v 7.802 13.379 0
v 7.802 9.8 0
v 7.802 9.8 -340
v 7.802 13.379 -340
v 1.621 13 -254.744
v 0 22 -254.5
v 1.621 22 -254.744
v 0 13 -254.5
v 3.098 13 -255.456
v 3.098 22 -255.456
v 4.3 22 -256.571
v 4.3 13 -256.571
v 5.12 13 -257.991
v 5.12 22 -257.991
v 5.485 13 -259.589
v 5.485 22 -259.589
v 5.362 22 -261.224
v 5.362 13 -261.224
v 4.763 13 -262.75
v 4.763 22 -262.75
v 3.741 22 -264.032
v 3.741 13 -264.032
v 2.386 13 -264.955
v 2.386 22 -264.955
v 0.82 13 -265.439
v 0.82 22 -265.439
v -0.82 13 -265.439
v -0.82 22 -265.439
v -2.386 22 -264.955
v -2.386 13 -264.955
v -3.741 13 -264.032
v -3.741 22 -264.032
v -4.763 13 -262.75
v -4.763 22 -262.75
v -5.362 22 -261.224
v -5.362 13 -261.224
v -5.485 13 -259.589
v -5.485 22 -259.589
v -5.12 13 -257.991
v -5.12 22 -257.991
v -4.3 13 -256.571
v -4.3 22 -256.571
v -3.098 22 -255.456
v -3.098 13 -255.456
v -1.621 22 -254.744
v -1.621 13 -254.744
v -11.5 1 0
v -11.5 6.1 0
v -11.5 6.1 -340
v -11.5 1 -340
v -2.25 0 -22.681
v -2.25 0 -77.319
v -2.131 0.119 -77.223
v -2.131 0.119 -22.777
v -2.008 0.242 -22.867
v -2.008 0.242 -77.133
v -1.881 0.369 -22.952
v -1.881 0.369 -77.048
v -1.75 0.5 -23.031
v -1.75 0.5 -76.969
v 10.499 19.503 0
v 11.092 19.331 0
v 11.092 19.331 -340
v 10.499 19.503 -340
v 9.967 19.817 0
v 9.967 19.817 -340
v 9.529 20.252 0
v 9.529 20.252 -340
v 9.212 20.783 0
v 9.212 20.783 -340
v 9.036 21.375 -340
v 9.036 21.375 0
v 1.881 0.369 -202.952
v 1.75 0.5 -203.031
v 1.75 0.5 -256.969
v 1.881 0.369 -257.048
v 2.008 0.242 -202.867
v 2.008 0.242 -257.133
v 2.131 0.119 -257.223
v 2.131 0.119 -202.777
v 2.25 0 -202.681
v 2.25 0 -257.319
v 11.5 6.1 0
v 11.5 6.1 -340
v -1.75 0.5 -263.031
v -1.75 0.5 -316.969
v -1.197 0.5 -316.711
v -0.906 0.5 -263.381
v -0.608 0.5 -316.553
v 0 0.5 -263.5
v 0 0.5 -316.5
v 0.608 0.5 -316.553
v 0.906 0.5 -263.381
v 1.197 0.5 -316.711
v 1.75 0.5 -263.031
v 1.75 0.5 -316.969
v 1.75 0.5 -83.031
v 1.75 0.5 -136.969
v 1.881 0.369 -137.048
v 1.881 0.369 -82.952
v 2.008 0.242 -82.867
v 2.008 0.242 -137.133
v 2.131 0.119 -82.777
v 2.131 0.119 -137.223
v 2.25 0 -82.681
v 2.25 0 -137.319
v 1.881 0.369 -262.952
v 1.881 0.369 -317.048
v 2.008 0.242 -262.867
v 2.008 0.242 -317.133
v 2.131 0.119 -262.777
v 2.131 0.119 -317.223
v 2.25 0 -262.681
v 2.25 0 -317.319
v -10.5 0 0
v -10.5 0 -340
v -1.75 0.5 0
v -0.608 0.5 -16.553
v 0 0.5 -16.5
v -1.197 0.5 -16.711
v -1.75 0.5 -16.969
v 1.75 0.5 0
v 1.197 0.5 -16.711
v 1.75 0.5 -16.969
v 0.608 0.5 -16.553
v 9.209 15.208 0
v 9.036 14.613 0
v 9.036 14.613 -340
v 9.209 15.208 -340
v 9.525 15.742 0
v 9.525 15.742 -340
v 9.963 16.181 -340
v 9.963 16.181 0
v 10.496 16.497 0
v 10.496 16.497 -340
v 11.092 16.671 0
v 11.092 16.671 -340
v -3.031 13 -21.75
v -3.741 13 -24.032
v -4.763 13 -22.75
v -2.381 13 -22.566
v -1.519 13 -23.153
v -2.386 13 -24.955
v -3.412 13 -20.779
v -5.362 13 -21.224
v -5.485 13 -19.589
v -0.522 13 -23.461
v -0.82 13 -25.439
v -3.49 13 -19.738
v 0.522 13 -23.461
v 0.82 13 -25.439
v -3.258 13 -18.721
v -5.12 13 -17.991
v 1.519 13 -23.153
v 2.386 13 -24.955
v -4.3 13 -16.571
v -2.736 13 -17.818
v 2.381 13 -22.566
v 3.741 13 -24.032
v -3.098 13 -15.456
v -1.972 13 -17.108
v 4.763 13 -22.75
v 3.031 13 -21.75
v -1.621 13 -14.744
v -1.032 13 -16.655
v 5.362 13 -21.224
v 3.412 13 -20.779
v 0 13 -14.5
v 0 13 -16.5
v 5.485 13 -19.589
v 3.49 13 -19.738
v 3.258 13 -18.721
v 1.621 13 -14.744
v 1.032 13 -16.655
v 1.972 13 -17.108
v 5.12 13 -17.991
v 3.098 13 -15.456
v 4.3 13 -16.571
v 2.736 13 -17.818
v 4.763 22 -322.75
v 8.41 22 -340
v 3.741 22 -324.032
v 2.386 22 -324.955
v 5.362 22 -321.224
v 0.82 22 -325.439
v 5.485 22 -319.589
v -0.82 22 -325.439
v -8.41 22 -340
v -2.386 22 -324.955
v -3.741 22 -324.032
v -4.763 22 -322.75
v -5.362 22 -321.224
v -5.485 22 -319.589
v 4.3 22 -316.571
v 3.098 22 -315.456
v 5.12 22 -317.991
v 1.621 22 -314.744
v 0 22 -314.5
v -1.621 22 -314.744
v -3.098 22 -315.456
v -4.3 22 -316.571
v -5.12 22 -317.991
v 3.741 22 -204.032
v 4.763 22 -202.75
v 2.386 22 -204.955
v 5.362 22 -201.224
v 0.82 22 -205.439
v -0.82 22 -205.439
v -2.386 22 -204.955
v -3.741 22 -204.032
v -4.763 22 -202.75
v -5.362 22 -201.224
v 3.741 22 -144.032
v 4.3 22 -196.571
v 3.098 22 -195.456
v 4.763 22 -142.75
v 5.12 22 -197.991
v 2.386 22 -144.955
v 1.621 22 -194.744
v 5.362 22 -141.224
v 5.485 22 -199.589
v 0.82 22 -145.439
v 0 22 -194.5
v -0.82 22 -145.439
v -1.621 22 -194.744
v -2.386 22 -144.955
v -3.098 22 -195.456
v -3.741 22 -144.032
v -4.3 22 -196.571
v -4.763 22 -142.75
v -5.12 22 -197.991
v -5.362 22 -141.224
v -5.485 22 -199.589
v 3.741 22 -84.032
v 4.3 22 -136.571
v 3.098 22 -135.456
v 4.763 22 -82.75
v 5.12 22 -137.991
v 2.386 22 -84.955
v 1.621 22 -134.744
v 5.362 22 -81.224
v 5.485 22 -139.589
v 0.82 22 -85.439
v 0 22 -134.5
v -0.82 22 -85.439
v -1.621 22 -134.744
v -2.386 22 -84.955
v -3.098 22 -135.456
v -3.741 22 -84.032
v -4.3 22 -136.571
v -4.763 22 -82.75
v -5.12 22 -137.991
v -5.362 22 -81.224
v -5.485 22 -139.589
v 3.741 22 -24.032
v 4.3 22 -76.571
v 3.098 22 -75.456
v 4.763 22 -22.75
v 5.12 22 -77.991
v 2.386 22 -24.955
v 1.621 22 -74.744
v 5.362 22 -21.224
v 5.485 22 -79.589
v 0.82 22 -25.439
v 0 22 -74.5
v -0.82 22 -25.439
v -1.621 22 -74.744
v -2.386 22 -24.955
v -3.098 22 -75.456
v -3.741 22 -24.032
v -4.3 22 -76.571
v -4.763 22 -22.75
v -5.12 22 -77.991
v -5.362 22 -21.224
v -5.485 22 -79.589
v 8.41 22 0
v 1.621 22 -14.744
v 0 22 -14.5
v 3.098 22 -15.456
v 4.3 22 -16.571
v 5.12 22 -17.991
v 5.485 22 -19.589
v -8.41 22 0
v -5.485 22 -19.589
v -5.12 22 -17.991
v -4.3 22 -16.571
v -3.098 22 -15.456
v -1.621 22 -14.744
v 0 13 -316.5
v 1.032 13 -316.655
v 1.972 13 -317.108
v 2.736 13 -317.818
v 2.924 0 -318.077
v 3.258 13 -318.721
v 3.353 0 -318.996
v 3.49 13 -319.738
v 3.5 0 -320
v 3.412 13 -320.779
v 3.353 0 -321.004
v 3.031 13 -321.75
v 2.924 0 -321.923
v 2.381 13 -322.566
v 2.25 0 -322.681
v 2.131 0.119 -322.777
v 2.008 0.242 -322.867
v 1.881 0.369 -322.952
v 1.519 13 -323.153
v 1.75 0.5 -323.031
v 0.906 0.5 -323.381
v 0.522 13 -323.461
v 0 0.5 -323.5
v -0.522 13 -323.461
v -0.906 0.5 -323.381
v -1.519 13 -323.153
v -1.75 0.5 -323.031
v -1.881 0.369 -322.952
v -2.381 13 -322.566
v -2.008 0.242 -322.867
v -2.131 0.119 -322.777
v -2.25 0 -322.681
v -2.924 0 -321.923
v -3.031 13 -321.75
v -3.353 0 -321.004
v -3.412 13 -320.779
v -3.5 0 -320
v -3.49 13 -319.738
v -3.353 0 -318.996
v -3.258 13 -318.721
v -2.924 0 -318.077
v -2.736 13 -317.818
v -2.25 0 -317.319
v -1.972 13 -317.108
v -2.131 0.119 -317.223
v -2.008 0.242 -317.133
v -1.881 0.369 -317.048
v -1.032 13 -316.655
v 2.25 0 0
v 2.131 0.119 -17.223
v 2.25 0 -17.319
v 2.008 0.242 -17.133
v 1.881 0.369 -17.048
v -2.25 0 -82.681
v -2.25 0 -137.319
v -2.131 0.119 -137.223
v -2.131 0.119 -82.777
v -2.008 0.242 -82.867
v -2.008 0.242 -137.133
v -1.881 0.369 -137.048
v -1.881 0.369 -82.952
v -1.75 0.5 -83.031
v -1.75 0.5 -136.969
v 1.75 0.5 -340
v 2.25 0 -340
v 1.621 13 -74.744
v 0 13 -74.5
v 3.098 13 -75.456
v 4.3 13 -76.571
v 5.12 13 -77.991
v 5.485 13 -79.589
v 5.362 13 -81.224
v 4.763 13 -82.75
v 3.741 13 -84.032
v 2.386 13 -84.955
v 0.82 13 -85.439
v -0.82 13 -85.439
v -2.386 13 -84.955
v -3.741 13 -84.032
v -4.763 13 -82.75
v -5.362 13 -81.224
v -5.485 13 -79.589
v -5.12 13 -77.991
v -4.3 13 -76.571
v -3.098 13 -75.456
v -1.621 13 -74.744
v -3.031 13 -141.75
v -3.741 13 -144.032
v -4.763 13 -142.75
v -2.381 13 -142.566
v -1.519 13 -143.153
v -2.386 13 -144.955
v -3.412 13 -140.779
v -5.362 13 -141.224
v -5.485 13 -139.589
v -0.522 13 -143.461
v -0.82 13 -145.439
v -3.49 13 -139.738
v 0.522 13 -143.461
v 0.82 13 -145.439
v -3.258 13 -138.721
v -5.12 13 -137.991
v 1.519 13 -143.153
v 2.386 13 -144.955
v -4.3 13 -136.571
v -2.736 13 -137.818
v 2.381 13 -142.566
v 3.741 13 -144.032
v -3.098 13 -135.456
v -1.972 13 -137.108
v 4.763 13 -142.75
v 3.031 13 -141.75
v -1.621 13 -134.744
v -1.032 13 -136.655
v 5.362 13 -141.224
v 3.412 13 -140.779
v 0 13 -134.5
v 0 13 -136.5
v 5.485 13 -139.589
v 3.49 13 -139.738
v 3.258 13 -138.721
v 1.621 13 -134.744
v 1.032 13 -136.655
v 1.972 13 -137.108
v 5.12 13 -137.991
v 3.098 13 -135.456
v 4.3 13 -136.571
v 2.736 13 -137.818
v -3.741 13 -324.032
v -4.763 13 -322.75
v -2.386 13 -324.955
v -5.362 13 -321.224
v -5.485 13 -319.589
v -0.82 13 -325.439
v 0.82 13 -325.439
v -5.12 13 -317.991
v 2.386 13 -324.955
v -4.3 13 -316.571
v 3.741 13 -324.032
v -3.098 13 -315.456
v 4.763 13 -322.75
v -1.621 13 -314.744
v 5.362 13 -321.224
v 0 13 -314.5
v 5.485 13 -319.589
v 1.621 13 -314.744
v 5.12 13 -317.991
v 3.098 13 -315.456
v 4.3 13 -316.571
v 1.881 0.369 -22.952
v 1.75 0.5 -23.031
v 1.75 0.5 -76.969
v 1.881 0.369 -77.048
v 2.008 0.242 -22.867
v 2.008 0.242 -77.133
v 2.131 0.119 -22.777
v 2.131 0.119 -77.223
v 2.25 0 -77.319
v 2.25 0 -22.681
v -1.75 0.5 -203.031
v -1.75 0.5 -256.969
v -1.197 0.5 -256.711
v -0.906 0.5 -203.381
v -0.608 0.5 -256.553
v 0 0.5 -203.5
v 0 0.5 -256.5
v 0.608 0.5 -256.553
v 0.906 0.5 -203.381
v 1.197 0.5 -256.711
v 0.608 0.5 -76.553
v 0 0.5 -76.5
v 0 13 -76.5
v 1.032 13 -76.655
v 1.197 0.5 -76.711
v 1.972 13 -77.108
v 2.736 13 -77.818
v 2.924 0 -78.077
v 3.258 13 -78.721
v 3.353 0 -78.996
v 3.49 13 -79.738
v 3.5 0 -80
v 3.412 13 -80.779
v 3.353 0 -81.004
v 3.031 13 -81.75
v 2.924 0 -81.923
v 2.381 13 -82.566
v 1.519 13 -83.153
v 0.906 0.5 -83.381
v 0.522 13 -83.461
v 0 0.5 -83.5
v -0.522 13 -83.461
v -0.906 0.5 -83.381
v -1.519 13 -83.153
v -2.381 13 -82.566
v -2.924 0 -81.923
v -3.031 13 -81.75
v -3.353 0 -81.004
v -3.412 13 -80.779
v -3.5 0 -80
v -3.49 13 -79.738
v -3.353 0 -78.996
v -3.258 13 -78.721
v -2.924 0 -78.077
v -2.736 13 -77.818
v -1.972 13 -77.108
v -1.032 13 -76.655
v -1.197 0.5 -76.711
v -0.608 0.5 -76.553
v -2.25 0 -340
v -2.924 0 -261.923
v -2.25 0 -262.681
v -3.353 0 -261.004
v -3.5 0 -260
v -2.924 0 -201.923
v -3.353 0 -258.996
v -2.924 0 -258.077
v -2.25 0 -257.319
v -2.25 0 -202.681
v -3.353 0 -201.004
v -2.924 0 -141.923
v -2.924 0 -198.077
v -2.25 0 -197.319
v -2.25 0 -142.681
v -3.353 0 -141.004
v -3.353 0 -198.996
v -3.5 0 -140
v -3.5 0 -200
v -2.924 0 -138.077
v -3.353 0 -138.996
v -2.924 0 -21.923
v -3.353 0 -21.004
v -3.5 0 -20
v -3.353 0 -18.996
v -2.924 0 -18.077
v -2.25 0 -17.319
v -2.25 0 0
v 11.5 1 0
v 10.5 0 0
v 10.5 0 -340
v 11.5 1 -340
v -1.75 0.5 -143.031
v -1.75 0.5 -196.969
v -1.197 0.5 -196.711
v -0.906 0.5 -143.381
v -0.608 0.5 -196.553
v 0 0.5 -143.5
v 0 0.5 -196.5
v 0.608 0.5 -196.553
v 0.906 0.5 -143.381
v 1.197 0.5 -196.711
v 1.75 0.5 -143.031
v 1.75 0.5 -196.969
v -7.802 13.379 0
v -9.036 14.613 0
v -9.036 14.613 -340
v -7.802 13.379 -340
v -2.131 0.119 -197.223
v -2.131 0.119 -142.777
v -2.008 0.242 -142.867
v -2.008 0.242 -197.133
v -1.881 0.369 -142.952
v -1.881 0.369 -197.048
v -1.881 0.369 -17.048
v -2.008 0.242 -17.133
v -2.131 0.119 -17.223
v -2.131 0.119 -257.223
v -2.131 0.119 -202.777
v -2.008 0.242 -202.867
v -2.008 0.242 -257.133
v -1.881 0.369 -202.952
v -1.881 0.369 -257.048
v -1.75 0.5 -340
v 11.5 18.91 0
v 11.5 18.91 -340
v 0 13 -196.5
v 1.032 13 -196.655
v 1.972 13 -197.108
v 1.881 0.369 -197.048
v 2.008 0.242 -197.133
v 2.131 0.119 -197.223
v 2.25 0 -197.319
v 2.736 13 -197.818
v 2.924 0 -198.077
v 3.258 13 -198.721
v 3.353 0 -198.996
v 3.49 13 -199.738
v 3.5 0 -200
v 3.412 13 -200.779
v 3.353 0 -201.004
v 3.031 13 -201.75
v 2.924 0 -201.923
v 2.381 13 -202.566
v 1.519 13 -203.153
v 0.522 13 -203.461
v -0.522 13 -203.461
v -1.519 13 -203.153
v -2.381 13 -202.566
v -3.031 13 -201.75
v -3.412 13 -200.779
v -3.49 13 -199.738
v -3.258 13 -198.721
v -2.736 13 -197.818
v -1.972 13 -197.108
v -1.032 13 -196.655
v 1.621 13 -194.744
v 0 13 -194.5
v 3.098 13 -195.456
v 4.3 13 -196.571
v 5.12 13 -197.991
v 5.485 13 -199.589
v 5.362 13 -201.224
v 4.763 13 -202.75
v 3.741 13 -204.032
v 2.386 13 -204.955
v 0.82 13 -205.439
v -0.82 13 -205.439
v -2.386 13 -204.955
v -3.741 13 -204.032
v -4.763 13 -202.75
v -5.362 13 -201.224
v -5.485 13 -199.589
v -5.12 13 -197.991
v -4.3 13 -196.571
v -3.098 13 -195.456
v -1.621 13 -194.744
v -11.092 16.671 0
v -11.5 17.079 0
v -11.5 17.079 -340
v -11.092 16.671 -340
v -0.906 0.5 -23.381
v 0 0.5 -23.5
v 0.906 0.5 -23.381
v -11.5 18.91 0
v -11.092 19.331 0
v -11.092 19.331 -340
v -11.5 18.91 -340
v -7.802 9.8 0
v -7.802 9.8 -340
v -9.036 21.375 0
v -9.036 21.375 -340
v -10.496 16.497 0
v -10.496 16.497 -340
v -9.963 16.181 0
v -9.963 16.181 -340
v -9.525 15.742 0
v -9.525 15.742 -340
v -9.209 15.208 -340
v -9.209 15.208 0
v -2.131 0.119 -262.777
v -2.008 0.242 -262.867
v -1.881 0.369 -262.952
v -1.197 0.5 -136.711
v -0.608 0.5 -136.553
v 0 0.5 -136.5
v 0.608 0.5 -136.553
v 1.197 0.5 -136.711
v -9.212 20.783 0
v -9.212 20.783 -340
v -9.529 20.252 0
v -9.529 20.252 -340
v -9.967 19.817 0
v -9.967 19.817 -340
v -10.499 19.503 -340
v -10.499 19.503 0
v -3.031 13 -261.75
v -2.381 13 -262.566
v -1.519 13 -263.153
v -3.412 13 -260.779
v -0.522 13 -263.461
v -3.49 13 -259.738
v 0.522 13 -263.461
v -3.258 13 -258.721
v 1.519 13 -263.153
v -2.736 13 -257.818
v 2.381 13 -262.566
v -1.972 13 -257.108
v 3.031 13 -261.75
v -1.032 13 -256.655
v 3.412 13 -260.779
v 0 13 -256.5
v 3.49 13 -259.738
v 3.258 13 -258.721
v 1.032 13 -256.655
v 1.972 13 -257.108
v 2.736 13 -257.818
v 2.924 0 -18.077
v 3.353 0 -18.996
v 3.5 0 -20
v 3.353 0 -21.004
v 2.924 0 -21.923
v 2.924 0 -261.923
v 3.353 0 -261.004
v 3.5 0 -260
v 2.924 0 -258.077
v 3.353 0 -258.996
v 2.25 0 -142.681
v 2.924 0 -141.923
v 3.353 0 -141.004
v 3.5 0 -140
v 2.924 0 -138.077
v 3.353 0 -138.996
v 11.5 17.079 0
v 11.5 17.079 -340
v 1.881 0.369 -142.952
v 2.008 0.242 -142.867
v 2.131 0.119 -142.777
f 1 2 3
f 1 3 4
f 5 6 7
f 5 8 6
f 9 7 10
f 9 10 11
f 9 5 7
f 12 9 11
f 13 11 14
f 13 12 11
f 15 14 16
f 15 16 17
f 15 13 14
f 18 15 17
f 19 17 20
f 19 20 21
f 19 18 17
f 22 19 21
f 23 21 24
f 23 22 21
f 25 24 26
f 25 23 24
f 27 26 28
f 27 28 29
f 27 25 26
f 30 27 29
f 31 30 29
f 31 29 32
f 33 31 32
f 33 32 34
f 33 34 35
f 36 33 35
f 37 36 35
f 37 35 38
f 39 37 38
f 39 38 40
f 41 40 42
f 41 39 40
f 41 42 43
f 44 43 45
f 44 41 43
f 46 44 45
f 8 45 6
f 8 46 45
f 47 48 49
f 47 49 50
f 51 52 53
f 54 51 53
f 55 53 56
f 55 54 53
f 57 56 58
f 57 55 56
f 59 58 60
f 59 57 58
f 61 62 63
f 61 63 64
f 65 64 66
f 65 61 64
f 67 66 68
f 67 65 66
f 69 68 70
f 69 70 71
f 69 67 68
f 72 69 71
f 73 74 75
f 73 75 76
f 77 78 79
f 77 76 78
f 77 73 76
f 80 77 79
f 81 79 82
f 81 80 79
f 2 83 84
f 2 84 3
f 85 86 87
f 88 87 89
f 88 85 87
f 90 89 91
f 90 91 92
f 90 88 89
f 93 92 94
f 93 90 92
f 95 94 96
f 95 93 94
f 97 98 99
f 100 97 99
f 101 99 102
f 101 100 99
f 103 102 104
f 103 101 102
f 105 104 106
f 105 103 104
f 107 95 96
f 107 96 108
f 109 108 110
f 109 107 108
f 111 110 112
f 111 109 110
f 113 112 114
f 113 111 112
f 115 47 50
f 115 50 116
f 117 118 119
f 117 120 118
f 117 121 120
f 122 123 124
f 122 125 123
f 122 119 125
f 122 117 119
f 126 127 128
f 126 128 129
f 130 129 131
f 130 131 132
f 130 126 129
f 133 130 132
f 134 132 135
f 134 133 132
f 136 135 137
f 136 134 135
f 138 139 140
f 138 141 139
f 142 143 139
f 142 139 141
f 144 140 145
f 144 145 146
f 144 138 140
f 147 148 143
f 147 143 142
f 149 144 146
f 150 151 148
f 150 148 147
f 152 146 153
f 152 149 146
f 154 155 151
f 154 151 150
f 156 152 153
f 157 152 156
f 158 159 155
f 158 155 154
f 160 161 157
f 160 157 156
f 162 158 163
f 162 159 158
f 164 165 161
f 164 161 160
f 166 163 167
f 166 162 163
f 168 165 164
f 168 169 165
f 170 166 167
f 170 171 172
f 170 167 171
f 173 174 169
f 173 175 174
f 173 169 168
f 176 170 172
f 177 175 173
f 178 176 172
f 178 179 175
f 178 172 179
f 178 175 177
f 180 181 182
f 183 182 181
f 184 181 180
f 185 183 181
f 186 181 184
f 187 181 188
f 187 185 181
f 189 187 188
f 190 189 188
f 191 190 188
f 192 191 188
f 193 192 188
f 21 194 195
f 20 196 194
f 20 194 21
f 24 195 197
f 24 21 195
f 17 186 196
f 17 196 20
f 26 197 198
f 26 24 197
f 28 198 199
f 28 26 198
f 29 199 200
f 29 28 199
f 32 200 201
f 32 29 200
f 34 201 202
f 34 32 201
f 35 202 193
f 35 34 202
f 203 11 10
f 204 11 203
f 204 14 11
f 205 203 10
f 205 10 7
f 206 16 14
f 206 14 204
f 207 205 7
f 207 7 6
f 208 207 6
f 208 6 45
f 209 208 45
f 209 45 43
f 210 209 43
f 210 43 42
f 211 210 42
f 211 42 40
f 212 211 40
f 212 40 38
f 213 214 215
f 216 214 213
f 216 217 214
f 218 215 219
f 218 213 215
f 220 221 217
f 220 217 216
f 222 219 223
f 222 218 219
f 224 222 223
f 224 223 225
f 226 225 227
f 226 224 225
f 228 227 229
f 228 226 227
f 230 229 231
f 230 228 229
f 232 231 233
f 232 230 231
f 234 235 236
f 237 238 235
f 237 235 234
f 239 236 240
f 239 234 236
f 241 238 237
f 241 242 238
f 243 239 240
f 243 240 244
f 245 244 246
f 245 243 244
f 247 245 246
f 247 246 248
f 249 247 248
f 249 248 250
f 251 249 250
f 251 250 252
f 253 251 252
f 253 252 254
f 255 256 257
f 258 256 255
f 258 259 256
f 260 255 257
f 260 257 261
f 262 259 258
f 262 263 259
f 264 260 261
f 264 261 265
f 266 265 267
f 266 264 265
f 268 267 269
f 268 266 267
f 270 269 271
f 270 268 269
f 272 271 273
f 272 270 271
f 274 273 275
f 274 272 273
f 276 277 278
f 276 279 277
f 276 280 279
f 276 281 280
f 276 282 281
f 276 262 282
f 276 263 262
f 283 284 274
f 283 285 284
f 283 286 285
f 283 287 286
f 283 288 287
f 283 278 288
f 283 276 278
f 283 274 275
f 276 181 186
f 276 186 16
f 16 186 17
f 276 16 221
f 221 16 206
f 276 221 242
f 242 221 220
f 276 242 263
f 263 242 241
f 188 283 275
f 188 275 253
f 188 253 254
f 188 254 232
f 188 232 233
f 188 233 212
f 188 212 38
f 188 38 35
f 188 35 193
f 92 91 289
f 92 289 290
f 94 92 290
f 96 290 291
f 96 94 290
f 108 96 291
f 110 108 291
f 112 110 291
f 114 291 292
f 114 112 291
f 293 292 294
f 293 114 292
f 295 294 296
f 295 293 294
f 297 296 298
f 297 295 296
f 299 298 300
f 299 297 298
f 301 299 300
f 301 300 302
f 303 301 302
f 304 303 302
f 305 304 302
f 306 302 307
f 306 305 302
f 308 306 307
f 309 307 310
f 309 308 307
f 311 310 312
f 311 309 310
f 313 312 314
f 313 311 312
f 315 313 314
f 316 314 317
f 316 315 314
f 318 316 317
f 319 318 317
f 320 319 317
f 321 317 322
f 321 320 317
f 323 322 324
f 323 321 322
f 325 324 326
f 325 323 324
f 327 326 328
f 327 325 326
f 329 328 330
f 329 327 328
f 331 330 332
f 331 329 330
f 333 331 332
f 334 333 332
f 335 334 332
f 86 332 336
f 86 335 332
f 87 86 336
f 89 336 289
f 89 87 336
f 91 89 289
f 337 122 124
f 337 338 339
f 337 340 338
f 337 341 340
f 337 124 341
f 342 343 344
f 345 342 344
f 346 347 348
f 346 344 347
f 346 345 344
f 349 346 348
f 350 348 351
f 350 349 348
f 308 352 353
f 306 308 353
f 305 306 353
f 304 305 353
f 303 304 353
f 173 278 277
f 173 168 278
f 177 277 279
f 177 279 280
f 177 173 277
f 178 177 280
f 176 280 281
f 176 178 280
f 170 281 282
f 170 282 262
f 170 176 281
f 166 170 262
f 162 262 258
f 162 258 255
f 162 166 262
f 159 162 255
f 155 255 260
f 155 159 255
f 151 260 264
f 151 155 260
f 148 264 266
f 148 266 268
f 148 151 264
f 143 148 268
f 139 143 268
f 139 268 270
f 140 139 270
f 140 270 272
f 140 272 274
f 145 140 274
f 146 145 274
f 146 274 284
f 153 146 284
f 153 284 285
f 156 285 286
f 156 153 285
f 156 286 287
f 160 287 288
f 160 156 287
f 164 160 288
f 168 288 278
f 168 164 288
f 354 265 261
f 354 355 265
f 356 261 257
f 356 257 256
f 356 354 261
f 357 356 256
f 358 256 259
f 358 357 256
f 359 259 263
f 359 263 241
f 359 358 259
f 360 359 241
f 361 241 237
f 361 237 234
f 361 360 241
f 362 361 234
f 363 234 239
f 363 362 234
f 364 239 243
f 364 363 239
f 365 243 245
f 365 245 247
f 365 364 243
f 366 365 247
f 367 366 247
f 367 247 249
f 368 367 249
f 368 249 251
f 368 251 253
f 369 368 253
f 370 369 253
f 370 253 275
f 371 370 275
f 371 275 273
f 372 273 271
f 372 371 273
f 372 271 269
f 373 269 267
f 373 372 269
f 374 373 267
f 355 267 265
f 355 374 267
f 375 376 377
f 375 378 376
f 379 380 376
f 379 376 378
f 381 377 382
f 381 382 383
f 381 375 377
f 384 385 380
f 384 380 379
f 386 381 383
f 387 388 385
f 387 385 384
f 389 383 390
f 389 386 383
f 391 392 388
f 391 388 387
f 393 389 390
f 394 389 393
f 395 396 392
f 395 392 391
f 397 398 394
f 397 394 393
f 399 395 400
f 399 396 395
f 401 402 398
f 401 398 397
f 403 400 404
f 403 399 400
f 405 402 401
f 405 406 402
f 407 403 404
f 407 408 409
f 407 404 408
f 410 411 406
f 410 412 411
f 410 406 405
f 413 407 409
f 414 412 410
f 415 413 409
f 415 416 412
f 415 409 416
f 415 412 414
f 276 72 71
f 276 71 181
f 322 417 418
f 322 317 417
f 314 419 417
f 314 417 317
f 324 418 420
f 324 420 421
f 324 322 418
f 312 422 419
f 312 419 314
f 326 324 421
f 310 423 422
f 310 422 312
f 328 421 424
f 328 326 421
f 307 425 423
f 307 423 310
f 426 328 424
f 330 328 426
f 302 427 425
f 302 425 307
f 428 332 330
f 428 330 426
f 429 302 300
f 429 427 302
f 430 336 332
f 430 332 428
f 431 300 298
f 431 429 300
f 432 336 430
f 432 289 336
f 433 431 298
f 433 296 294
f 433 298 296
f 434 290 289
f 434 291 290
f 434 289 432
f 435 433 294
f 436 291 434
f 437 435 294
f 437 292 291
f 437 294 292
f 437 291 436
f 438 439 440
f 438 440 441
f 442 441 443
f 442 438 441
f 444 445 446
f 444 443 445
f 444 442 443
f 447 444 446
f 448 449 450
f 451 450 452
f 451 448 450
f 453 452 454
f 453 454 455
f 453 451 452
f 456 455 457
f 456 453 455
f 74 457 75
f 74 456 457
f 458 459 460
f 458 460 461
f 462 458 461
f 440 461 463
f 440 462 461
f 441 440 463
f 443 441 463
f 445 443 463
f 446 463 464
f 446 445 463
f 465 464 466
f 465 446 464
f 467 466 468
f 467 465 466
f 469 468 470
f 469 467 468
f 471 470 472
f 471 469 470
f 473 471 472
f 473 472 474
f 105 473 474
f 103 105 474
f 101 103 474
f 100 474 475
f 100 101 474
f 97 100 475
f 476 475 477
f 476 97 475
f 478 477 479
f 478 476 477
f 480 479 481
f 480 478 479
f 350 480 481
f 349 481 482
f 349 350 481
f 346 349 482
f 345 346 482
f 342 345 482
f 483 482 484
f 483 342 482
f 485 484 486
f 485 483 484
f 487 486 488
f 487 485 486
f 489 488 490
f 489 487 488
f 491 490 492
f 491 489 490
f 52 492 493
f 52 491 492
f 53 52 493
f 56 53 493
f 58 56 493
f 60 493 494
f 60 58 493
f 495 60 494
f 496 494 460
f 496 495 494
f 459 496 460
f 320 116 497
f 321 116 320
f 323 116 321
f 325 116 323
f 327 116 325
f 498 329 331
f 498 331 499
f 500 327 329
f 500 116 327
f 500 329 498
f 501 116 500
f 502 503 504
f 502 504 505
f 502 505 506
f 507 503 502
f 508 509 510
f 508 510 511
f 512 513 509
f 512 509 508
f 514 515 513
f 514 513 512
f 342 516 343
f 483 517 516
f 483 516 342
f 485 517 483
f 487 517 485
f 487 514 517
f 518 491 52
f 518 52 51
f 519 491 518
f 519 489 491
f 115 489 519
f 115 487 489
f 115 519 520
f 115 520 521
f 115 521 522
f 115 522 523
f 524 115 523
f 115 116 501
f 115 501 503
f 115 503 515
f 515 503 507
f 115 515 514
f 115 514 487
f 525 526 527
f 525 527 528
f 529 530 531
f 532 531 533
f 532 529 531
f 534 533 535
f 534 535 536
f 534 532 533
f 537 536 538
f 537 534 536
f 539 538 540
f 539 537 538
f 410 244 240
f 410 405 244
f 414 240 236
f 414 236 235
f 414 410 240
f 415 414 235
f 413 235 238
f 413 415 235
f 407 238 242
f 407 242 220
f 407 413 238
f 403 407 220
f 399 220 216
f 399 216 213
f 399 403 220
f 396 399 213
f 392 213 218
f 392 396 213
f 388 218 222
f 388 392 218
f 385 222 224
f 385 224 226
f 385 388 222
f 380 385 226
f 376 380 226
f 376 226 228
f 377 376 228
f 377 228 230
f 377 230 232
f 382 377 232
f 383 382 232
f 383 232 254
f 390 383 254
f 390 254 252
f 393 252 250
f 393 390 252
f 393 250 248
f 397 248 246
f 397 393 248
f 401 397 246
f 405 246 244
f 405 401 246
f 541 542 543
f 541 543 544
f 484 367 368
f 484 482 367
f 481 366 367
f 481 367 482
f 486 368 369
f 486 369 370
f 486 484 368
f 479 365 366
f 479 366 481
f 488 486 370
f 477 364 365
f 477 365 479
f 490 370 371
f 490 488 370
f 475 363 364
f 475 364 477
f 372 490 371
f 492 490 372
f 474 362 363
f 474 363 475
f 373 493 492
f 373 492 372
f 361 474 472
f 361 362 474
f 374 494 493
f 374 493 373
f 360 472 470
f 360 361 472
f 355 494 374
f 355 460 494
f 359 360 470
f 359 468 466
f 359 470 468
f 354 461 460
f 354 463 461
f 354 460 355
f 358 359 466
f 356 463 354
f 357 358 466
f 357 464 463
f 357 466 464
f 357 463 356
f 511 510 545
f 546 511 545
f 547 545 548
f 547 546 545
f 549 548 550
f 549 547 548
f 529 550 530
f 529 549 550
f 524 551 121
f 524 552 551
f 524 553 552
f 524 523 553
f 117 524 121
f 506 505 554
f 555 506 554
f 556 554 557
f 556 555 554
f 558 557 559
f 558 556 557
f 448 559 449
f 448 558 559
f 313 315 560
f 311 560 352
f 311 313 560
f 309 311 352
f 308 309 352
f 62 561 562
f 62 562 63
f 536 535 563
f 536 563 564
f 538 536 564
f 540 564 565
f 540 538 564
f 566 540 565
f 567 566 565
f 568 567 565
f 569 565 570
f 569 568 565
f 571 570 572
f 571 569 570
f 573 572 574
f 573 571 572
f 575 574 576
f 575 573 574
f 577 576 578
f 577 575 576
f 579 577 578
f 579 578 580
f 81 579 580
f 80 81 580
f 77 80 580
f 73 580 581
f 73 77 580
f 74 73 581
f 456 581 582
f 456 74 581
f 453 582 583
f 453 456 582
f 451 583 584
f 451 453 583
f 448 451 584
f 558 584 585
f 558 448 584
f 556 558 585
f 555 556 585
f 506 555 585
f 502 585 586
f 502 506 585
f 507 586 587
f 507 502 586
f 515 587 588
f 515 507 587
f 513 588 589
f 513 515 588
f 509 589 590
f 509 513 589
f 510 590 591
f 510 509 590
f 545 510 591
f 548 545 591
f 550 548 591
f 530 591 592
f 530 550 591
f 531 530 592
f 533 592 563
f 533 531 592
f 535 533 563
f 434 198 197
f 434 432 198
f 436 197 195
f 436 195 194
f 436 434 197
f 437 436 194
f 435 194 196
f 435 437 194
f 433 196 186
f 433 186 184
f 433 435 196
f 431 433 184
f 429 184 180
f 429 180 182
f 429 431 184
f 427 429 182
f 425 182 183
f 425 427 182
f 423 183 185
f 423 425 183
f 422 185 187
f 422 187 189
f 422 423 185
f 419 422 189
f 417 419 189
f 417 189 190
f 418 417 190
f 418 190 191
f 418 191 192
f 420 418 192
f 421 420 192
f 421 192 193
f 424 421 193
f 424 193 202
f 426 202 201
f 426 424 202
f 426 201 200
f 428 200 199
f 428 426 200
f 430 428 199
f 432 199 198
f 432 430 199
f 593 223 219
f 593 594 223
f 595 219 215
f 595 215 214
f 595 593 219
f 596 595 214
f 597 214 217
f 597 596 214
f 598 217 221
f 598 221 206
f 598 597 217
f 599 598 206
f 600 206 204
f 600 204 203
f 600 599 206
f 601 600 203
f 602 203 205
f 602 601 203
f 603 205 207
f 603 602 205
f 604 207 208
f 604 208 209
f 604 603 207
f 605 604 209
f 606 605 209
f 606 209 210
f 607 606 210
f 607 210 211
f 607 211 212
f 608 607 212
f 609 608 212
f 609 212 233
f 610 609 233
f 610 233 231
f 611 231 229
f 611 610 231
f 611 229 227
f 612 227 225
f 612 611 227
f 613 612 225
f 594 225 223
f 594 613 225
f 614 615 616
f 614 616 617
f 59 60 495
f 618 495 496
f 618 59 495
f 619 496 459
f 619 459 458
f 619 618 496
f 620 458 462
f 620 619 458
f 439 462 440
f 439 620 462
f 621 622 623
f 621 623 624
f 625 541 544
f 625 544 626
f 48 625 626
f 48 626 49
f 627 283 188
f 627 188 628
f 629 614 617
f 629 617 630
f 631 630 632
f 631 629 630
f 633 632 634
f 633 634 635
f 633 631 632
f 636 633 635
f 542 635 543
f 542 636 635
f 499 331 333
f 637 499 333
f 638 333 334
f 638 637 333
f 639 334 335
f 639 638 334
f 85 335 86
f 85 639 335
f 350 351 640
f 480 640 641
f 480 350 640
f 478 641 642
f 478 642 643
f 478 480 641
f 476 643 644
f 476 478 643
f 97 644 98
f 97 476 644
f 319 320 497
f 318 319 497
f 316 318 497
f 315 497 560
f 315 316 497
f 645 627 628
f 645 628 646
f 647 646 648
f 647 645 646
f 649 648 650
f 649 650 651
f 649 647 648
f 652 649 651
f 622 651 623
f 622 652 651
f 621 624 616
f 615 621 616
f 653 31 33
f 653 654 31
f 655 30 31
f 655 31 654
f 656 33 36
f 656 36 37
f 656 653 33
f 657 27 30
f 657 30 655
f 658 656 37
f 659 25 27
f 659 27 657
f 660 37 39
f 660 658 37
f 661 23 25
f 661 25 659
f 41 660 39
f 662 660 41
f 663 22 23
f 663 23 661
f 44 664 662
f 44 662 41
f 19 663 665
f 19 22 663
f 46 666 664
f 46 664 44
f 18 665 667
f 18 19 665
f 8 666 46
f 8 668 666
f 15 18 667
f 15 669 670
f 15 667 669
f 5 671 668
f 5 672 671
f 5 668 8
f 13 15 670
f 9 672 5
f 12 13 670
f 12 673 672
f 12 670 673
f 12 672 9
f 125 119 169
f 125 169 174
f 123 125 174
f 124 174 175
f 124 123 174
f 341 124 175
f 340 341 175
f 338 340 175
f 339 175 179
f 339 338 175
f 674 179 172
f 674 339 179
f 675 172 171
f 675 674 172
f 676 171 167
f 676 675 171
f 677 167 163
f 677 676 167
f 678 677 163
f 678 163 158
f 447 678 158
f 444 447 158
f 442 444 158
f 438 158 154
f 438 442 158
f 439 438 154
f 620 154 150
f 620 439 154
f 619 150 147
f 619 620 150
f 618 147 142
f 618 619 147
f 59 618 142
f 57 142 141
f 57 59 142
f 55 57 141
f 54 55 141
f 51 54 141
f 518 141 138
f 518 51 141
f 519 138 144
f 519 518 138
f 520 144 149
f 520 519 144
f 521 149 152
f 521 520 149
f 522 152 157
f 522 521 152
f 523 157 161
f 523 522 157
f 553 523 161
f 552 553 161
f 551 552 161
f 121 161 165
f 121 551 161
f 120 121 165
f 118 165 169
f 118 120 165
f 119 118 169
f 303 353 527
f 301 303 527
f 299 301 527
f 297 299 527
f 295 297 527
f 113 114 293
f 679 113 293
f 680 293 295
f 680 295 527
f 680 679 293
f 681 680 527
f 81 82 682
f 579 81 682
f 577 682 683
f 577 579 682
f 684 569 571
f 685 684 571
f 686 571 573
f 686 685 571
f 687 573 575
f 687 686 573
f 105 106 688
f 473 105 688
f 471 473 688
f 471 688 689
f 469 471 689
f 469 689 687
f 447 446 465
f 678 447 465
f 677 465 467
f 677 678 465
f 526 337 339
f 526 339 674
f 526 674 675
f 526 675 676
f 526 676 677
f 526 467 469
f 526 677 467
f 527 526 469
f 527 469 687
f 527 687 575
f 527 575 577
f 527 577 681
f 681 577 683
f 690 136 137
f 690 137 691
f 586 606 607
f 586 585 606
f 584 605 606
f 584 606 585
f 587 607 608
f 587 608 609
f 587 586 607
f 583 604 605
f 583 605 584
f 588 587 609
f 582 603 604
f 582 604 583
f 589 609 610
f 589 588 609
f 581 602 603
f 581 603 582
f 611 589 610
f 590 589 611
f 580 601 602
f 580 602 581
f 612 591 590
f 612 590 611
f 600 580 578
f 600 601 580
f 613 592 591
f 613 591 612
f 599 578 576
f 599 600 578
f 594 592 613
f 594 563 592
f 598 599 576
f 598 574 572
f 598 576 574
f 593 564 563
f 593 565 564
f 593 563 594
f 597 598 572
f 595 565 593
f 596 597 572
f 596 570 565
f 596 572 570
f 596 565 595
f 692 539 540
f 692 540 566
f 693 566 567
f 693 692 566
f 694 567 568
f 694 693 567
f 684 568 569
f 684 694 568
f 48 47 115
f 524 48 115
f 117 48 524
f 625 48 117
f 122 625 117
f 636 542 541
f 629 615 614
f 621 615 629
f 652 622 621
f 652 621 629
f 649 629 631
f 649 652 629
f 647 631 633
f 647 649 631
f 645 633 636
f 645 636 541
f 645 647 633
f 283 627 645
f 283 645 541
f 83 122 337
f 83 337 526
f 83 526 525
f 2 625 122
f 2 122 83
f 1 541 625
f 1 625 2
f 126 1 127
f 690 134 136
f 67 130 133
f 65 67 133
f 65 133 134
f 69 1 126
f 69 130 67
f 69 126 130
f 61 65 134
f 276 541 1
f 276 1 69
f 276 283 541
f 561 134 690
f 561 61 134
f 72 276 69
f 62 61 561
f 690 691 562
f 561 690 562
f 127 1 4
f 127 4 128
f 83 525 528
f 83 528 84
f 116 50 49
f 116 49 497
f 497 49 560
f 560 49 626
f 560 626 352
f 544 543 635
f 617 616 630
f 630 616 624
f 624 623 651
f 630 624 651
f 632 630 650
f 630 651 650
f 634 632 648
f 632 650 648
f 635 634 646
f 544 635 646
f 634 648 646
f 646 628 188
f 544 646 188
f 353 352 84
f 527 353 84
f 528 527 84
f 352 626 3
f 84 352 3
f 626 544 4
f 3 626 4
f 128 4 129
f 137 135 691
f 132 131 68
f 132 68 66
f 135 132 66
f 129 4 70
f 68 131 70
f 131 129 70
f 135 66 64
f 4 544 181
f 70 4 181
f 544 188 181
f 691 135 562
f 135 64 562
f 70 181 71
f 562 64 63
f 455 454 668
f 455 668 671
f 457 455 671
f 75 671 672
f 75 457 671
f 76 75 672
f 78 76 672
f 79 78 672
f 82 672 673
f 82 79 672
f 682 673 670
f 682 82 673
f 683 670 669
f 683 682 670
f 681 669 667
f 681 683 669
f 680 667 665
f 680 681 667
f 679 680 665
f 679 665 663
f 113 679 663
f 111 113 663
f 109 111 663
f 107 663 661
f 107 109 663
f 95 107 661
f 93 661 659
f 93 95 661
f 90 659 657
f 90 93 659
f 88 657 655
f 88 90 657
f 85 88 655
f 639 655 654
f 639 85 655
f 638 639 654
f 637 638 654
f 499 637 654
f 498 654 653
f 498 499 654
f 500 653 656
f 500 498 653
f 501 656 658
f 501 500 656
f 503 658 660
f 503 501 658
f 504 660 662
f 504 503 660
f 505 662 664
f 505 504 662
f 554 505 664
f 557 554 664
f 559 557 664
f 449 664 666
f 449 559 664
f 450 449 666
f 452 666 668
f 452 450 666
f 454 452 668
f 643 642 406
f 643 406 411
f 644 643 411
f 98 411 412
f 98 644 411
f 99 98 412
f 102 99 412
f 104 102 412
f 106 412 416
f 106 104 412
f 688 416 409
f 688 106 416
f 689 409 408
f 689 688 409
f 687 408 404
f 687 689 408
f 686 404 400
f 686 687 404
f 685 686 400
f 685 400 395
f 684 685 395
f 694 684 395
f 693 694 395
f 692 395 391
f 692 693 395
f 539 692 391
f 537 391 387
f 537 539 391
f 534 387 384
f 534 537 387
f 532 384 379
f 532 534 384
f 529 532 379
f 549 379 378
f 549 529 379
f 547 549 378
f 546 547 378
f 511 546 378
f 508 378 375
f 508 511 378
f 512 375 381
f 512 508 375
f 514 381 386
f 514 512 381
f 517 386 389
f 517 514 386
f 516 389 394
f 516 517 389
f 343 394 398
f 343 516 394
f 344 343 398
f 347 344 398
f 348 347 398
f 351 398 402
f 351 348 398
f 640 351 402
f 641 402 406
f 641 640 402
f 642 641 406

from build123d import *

# Parameters (mm, degrees)
EXTRUDE1_DEPTH  = 340
LPATTERN1_COUNT = 6
LPATTERN1_PITCH = 60


with BuildPart() as part:
    # Sketch1 → Extrude1 (new body)
    with BuildSketch(Plane(origin=(-20, 0, 0), x_dir=(1, 0, 0), z_dir=(0, 0, 1))):
        with BuildLine():
            Line((8.5, 18.910271646), (8.5, 17.079302786))
            Line((8.5, 17.079302786), (8.908405711, 16.67089517))
            ThreePointArc((8.908405711, 16.67089517), (10.269774971, 15.975032022), (10.964333487, 14.612996689))
            Line((10.964333487, 14.612996689), (12.197979513, 13.379350662))
            Line((12.197979513, 13.379350662), (12.197979513, 9.800170422))
            Line((12.197979513, 9.800170422), (8.5, 6.10021925))
            Line((8.5, 6.10021925), (8.5, 1))
            Line((8.5, 1), (9.5, 0))
            Line((9.5, 0), (17.75, 0))
            Line((17.75, 0), (18.25, 0.5))
            Line((18.25, 0.5), (21.75, 0.5))
            Line((21.75, 0.5), (22.25, 0))
            Line((22.25, 0), (30.5, 0))
            Line((30.5, 0), (31.5, 1))
            Line((31.5, 1), (31.5, 6.10021925))
            Line((31.5, 6.10021925), (27.802020487, 9.800170422))
            Line((27.802020487, 9.800170422), (27.802020487, 13.379350662))
            Line((27.802020487, 13.379350662), (29.035666513, 14.612996689))
            ThreePointArc((29.035666513, 14.612996689), (29.730225029, 15.975032022), (31.091594289, 16.67089517))
            Line((31.091594289, 16.67089517), (31.5, 17.079302786))
            Line((31.5, 17.079302786), (31.5, 18.910271646))
            Line((31.5, 18.910271646), (31.091594289, 19.330832529))
            ThreePointArc((31.091594289, 19.330832529), (29.733913517, 20.021041613), (29.035666513, 21.374606084))
            Line((29.035666513, 21.374606084), (28.410271644, 22))
            Line((28.410271644, 22), (11.589728356, 22))
            Line((11.589728356, 22), (10.964333487, 21.374606084))
            ThreePointArc((10.964333487, 21.374606084), (10.266086483, 20.021041613), (8.908405711, 19.330832529))
            Line((8.908405711, 19.330832529), (8.5, 18.910271646))
        make_face()
    extrude(amount=-EXTRUDE1_DEPTH)

    # Sketch2 → Cut-Revolve1 (revolve, cut)
    with BuildSketch(Plane(origin=(0, 0, 0), x_dir=(0, 0, -1), z_dir=(1, 0, 0))):
        Polygon((20, 22), (25.5, 22), (25.5, 13), (23.5, 13), (23.5, 0), (20, 0), align=None)
    cut_revolve1 = revolve(axis=Axis((0, 0, -20), (0, 1, 0)), mode=Mode.SUBTRACT)

    # LPattern1: Cut-Revolve1 ×6
    with Locations(*[(0, 0, -i * LPATTERN1_PITCH) for i in range(1, LPATTERN1_COUNT)]):
        add(cut_revolve1, mode=Mode.SUBTRACT)


solid = part.part
